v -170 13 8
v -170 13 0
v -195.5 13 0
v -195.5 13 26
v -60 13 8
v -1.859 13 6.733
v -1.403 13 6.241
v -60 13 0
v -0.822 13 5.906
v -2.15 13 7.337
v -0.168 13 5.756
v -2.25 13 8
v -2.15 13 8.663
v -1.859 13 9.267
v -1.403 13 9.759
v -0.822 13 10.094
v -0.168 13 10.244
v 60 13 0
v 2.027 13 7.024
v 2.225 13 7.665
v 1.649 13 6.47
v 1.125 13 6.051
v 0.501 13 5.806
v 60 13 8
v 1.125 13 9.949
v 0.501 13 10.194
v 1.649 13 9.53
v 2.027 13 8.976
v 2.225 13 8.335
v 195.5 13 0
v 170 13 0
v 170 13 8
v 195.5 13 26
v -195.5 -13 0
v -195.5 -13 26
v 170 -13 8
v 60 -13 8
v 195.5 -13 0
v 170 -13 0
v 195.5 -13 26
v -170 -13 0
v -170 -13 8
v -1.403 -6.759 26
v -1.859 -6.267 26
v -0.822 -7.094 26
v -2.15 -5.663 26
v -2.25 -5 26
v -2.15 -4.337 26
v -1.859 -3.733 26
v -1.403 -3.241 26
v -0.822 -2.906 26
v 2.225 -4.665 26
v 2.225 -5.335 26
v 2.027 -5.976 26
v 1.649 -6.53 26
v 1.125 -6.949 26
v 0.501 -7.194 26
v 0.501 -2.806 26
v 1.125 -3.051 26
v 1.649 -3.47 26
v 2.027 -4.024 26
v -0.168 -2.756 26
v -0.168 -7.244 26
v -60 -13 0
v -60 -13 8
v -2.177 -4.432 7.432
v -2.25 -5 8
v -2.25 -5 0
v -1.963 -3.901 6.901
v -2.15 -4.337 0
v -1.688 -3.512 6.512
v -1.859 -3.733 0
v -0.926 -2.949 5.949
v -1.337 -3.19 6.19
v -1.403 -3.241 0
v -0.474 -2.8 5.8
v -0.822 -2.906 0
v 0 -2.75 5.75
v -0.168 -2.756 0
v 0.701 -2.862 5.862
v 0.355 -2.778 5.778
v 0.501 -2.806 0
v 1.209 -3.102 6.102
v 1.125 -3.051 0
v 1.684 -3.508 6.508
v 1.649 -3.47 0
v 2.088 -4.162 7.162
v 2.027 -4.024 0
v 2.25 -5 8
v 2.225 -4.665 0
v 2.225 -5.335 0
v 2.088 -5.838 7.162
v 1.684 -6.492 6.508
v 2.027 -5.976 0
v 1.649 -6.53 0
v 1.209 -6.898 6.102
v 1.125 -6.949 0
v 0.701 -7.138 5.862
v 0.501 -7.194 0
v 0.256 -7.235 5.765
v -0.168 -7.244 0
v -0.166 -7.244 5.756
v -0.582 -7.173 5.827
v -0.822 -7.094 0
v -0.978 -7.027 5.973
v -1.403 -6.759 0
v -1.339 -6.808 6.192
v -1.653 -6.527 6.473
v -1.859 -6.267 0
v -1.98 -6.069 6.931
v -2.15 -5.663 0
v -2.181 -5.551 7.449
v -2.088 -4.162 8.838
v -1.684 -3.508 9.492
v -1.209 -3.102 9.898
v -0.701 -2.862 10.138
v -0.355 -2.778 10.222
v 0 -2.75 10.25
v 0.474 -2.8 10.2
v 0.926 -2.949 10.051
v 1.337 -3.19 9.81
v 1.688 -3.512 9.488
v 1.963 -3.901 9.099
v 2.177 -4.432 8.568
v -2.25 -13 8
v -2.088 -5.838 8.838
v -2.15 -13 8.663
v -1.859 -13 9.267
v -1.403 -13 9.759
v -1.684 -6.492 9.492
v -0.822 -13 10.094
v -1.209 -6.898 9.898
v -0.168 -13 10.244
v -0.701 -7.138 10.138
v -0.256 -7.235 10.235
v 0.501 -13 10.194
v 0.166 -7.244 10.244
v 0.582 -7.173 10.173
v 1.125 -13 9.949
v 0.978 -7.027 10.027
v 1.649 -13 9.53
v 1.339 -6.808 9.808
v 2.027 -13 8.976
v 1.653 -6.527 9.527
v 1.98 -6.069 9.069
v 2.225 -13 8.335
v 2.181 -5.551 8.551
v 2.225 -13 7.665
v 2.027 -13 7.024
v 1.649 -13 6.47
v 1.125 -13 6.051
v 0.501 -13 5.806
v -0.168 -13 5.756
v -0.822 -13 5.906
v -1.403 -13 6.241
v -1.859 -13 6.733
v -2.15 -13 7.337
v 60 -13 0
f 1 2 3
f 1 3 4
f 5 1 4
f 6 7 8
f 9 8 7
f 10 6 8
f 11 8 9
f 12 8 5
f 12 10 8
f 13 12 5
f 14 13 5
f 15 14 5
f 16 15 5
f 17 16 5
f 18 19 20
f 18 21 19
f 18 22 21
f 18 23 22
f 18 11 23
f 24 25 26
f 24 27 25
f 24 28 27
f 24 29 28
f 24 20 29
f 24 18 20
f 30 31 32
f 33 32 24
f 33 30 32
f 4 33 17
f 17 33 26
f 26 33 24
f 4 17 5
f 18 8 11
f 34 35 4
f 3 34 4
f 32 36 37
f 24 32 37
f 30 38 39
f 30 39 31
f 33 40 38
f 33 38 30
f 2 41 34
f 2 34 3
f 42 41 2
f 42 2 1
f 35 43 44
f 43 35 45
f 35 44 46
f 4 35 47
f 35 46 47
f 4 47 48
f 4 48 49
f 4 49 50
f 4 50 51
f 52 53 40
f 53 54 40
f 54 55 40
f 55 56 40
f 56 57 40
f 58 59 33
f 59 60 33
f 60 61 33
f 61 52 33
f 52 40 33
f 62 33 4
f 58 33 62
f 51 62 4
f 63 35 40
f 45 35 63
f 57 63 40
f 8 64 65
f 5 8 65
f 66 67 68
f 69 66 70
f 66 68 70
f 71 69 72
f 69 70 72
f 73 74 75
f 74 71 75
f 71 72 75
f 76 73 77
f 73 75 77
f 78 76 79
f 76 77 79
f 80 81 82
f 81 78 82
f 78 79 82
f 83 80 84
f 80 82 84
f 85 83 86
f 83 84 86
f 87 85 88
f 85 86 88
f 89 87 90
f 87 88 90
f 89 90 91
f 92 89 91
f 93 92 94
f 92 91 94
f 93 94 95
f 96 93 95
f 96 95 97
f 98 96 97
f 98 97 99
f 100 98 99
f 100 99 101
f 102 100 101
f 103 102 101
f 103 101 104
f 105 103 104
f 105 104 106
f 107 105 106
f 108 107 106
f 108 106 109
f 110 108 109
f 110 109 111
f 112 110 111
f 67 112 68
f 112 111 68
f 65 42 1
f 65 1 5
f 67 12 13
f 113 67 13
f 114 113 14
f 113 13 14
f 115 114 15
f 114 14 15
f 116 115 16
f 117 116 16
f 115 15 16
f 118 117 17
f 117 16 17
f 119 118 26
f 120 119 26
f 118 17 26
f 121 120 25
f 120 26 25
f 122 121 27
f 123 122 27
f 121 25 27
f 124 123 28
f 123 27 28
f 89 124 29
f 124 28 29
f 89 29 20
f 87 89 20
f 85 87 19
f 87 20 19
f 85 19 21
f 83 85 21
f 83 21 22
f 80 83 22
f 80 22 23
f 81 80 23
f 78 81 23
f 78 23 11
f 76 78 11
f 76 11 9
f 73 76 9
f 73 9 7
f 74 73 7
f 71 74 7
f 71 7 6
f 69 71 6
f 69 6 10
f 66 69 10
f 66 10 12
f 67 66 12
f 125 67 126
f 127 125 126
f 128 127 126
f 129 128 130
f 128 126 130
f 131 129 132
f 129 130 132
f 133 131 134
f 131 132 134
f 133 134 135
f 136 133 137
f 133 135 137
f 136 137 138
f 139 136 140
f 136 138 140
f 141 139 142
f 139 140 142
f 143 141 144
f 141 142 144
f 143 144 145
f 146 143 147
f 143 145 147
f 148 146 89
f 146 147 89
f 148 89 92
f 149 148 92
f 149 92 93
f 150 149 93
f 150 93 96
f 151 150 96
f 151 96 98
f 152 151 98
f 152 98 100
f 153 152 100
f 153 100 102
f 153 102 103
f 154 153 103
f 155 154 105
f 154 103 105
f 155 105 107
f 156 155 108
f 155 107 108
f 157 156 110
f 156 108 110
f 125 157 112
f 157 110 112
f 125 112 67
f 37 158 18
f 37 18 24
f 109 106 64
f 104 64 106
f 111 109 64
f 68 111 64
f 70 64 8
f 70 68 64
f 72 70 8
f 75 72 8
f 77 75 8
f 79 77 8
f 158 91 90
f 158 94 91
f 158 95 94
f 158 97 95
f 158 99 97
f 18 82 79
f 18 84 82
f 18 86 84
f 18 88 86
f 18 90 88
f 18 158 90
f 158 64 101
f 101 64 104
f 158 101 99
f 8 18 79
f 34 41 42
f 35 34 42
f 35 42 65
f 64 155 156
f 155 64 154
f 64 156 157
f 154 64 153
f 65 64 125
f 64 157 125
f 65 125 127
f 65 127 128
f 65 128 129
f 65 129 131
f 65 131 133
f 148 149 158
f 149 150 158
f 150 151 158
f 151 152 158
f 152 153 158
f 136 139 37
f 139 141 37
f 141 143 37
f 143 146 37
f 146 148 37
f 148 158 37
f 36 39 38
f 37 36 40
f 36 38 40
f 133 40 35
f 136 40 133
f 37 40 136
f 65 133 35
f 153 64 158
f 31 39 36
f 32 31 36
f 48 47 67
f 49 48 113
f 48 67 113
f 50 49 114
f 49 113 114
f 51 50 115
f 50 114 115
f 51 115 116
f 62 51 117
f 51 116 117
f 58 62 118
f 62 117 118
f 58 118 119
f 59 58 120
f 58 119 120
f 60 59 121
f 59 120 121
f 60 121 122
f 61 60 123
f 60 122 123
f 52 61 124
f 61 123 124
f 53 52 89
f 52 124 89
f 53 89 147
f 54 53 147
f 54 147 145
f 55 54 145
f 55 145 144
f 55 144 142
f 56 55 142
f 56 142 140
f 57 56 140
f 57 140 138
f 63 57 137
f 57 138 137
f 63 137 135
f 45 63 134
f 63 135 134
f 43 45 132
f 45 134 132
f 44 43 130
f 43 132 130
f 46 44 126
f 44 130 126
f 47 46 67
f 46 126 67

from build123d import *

# Parameters (mm, degrees)
F0_W     = 26
F0_H     = 26
F1_DEPTH = 195.5
F3_W     = 110
F3_H     = 8
F4_DEPTH = 26
F6_D     = 4.5
F8_D     = 4.5


# Not quite as in the source:
# - a pattern or mirror of a feature is missing from the dataset's text; its kind, count and spacing are read off the source's solid


with BuildPart() as f1:
    # F0 (on Right) → F1 (new body, symmetric)
    with BuildSketch(Plane.YZ):
        with Locations((0, 13)):
            Rectangle(F0_W, F0_H)
    extrude(amount=F1_DEPTH, both=True)

    # F3 (on face) → F4 (cut, through all)
    with BuildSketch(Plane.XZ.offset(13)):
        with Locations((-115, 4)):
            Rectangle(F3_W, F3_H)
    f4 = extrude(amount=-F4_DEPTH, mode=Mode.SUBTRACT)

    # F4_copies: F4 across plane
    add(f4.mirror(Plane(origin=(0, 0, 0), x_dir=(0, 0, 1), z_dir=(1, 0, 0))), mode=Mode.SUBTRACT)

    # F6 (through all)
    with Locations(Plane.XZ.offset(13)):
        with Locations((0, 8)):
            Hole(F6_D / 2)

    # F8 (through all)
    with Locations(Plane.XY.offset(26)):
        with Locations((0, -5)):
            Hole(F8_D / 2)


solid = f1.part
